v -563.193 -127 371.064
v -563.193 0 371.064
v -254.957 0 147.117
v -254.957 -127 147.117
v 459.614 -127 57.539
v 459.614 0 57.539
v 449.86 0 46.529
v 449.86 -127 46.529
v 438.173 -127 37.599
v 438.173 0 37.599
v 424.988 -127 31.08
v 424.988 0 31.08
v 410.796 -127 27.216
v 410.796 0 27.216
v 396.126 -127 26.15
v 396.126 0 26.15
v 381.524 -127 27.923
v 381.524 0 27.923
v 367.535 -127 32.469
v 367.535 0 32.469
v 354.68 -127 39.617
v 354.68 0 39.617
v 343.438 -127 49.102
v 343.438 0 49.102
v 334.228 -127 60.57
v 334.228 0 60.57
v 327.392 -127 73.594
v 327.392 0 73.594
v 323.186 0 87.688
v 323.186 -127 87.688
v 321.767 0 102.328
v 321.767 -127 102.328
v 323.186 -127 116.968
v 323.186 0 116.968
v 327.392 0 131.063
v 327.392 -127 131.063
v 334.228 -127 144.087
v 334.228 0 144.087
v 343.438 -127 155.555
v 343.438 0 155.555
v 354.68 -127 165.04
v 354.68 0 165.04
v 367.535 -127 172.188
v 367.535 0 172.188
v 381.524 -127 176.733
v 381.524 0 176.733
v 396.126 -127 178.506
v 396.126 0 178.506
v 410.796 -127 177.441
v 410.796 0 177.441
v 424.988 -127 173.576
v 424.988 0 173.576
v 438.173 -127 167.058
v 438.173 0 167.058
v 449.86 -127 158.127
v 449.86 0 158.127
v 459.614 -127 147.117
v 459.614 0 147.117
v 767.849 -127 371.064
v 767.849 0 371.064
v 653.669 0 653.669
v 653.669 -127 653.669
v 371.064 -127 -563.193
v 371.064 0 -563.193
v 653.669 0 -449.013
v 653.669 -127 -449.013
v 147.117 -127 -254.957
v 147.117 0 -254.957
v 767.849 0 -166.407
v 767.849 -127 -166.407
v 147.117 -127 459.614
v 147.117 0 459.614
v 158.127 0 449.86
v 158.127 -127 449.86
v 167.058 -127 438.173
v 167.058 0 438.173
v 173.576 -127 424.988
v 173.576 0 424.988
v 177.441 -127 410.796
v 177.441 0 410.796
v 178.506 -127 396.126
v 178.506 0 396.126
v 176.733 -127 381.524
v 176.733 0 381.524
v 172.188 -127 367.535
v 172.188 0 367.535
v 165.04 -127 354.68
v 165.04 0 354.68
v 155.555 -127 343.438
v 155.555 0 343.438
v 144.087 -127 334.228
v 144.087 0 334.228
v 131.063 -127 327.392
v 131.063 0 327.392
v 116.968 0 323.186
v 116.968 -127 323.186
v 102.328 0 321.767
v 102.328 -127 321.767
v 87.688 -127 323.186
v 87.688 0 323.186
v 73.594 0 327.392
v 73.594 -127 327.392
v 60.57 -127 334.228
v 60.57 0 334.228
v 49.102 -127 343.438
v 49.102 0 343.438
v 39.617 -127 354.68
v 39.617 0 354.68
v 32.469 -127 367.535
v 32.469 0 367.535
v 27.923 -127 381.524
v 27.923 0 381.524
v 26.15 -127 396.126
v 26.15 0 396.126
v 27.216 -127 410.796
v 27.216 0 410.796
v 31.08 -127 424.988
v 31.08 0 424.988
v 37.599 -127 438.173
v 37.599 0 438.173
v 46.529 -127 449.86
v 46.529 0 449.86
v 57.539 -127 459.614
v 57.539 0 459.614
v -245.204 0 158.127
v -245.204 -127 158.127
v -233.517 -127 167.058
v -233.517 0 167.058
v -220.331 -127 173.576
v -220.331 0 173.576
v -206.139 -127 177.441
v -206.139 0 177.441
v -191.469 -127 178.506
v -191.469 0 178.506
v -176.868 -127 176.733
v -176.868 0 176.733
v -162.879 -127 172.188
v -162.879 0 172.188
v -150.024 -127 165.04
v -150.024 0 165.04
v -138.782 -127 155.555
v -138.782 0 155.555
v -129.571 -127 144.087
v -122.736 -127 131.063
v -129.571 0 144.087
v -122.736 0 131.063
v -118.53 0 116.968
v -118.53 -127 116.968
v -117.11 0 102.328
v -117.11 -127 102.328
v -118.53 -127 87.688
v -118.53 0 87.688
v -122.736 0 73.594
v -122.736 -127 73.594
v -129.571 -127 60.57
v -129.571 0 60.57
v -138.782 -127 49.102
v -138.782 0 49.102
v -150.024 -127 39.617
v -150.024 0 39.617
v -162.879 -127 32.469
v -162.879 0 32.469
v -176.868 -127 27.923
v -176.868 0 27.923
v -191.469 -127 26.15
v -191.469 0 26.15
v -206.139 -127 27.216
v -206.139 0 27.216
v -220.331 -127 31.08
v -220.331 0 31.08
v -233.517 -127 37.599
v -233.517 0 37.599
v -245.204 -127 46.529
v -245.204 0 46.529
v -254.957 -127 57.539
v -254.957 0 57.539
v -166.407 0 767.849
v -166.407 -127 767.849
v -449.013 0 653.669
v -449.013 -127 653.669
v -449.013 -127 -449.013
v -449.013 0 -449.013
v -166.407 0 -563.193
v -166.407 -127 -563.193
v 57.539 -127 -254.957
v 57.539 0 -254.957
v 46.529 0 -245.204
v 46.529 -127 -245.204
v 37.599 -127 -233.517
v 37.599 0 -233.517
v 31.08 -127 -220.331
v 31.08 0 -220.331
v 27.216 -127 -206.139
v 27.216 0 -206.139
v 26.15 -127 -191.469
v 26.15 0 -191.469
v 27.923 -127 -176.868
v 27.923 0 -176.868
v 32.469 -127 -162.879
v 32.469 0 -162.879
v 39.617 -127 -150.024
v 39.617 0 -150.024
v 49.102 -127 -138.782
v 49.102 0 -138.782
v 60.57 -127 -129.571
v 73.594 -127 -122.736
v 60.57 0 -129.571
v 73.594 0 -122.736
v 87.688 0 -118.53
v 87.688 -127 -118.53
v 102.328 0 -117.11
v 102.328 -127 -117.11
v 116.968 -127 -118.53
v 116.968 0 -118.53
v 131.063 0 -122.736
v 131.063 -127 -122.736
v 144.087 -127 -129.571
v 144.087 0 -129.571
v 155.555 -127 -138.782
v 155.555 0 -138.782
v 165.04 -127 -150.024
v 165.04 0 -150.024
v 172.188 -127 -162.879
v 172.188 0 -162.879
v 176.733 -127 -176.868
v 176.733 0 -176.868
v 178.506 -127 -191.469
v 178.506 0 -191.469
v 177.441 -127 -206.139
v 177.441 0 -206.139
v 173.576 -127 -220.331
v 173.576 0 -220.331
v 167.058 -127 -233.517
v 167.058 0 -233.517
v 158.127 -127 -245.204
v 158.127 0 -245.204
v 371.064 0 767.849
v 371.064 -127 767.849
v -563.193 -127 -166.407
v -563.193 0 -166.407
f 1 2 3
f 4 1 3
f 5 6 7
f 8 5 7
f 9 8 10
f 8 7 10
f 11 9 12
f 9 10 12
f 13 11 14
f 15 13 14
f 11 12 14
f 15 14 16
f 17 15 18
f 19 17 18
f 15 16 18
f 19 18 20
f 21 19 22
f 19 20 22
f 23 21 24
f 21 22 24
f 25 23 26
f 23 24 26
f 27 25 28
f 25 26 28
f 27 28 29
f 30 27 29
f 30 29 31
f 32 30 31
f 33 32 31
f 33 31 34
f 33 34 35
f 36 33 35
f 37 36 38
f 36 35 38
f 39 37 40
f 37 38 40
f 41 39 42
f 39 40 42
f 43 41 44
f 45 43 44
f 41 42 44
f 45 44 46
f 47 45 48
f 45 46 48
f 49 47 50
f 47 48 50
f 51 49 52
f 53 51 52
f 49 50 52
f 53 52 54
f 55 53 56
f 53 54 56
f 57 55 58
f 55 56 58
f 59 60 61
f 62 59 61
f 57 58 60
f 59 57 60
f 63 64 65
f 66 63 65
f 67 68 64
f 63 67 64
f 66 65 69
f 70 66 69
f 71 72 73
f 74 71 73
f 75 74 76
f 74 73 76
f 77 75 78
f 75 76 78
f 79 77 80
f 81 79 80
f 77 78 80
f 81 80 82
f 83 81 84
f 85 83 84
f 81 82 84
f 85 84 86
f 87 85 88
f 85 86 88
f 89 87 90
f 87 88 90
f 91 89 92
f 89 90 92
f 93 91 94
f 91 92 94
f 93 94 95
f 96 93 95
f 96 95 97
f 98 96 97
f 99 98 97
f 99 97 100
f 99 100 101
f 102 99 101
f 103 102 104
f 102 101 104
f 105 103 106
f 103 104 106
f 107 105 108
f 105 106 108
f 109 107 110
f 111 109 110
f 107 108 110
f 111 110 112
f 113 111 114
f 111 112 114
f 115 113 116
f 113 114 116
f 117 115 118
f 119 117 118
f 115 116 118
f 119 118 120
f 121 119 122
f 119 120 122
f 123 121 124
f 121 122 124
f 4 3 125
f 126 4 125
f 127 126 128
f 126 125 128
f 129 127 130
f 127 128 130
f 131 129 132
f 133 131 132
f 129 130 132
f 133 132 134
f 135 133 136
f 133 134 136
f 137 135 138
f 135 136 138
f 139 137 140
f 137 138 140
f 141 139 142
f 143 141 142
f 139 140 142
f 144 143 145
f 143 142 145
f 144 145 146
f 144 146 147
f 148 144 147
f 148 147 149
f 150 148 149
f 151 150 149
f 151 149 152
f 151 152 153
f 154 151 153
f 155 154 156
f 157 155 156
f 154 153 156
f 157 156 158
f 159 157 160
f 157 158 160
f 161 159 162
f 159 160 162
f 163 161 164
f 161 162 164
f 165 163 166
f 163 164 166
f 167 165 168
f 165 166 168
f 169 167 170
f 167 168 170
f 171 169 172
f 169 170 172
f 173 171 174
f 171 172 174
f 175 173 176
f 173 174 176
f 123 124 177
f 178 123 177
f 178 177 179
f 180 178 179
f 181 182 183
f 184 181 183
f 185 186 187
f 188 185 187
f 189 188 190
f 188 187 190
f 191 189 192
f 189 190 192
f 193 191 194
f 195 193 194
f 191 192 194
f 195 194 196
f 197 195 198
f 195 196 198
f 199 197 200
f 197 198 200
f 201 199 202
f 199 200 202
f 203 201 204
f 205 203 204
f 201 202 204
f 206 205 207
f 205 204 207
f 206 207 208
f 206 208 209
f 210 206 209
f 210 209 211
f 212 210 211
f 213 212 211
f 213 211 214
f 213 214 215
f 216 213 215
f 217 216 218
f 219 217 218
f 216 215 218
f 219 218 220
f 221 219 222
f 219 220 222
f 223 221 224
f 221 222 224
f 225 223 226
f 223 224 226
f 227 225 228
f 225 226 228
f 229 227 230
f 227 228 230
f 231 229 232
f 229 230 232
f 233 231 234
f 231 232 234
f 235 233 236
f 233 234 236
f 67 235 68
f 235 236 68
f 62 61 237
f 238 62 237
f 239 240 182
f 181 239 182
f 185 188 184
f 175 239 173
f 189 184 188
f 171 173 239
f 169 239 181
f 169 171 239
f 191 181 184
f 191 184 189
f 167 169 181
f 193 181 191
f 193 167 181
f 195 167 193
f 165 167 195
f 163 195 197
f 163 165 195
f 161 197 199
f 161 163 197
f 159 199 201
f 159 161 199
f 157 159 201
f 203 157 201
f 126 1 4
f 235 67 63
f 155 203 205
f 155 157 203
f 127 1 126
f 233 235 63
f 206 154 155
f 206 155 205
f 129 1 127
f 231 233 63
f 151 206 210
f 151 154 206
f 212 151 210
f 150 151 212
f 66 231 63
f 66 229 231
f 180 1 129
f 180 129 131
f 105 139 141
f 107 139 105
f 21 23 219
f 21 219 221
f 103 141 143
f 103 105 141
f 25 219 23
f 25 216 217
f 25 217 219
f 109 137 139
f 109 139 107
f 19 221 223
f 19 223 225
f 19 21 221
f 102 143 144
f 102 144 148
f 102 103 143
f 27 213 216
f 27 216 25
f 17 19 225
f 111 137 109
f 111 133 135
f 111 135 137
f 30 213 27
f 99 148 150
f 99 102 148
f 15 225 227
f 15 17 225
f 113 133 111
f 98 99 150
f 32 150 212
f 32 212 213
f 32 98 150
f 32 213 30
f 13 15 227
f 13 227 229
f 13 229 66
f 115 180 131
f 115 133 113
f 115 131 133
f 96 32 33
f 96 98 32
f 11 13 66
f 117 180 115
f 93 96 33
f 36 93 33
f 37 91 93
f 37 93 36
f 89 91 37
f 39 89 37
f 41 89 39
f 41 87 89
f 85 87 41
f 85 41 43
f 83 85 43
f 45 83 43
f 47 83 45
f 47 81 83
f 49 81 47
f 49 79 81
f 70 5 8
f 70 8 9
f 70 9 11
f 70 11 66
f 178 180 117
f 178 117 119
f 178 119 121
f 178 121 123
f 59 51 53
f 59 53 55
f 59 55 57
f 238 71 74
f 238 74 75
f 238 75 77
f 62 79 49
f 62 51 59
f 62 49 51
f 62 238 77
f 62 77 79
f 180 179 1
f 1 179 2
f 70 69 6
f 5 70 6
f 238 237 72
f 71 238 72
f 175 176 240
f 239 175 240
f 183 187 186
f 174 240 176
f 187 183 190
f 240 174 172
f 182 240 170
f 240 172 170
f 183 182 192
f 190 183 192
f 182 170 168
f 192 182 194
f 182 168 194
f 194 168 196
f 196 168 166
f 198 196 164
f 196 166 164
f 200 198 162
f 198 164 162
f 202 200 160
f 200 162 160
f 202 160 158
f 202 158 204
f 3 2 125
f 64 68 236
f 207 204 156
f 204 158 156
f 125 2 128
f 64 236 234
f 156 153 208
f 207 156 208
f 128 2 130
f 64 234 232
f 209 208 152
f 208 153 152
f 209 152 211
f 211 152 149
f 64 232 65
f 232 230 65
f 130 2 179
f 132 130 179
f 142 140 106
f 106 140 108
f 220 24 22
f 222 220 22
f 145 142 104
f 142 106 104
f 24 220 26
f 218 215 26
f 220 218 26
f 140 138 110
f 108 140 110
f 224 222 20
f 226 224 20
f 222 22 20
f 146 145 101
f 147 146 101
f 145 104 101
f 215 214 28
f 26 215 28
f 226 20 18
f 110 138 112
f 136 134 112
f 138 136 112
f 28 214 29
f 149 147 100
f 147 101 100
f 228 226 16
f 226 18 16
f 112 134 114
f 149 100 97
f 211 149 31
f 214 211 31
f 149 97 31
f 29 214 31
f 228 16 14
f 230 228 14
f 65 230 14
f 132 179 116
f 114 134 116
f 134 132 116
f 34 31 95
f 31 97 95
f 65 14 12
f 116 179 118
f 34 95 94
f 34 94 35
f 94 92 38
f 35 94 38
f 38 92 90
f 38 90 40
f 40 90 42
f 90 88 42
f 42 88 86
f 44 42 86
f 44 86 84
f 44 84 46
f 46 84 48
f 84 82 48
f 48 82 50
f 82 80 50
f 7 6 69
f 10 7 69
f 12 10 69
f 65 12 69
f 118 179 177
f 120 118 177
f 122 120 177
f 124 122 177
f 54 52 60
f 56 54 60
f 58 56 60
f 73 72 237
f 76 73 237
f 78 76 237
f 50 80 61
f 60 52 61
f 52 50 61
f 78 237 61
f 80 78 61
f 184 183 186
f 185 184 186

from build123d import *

# Parameters (mm, degrees)
F1_DEPTH = 127


with BuildPart() as f1:
    # F0 (on Front) → F1 (new body)
    with BuildSketch(Plane.XZ):
        with BuildLine():
            Line((-563.192896, -166.407167), (-449.012806, -449.012806))
            Line((-449.012806, -449.012806), (-166.407167, -563.192896))
            Line((-166.407167, -563.192896), (57.539014, -254.957421))
            ThreePointArc((57.539014, -254.957421), (102.32825, -117.110326), (147.117486, -254.957421))
            Line((147.117486, -254.957421), (371.063668, -563.192896))
            Line((371.063668, -563.192896), (653.669306, -449.012806))
            Line((653.669306, -449.012806), (767.849396, -166.407167))
            Line((767.849396, -166.407167), (459.613921, 57.539014))
            ThreePointArc((459.613921, 57.539014), (321.766826, 102.32825), (459.613921, 147.117486))
            Line((459.613921, 147.117486), (767.849396, 371.063668))
            Line((767.849396, 371.063668), (653.669306, 653.669306))
            Line((653.669306, 653.669306), (371.063668, 767.849396))
            Line((371.063668, 767.849396), (147.117486, 459.613921))
            ThreePointArc((147.117486, 459.613921), (102.32825, 321.766826), (57.539014, 459.613921))
            Line((57.539014, 459.613921), (-166.407167, 767.849396))
            Line((-166.407167, 767.849396), (-449.012806, 653.669306))
            Line((-449.012806, 653.669306), (-563.192896, 371.063668))
            Line((-563.192896, 371.063668), (-254.957421, 147.117486))
            ThreePointArc((-254.957421, 147.117486), (-117.110326, 102.32825), (-254.957421, 57.539014))
            Line((-254.957421, 57.539014), (-563.192896, -166.407167))
        make_face()
    extrude(amount=F1_DEPTH)


solid = f1.part
